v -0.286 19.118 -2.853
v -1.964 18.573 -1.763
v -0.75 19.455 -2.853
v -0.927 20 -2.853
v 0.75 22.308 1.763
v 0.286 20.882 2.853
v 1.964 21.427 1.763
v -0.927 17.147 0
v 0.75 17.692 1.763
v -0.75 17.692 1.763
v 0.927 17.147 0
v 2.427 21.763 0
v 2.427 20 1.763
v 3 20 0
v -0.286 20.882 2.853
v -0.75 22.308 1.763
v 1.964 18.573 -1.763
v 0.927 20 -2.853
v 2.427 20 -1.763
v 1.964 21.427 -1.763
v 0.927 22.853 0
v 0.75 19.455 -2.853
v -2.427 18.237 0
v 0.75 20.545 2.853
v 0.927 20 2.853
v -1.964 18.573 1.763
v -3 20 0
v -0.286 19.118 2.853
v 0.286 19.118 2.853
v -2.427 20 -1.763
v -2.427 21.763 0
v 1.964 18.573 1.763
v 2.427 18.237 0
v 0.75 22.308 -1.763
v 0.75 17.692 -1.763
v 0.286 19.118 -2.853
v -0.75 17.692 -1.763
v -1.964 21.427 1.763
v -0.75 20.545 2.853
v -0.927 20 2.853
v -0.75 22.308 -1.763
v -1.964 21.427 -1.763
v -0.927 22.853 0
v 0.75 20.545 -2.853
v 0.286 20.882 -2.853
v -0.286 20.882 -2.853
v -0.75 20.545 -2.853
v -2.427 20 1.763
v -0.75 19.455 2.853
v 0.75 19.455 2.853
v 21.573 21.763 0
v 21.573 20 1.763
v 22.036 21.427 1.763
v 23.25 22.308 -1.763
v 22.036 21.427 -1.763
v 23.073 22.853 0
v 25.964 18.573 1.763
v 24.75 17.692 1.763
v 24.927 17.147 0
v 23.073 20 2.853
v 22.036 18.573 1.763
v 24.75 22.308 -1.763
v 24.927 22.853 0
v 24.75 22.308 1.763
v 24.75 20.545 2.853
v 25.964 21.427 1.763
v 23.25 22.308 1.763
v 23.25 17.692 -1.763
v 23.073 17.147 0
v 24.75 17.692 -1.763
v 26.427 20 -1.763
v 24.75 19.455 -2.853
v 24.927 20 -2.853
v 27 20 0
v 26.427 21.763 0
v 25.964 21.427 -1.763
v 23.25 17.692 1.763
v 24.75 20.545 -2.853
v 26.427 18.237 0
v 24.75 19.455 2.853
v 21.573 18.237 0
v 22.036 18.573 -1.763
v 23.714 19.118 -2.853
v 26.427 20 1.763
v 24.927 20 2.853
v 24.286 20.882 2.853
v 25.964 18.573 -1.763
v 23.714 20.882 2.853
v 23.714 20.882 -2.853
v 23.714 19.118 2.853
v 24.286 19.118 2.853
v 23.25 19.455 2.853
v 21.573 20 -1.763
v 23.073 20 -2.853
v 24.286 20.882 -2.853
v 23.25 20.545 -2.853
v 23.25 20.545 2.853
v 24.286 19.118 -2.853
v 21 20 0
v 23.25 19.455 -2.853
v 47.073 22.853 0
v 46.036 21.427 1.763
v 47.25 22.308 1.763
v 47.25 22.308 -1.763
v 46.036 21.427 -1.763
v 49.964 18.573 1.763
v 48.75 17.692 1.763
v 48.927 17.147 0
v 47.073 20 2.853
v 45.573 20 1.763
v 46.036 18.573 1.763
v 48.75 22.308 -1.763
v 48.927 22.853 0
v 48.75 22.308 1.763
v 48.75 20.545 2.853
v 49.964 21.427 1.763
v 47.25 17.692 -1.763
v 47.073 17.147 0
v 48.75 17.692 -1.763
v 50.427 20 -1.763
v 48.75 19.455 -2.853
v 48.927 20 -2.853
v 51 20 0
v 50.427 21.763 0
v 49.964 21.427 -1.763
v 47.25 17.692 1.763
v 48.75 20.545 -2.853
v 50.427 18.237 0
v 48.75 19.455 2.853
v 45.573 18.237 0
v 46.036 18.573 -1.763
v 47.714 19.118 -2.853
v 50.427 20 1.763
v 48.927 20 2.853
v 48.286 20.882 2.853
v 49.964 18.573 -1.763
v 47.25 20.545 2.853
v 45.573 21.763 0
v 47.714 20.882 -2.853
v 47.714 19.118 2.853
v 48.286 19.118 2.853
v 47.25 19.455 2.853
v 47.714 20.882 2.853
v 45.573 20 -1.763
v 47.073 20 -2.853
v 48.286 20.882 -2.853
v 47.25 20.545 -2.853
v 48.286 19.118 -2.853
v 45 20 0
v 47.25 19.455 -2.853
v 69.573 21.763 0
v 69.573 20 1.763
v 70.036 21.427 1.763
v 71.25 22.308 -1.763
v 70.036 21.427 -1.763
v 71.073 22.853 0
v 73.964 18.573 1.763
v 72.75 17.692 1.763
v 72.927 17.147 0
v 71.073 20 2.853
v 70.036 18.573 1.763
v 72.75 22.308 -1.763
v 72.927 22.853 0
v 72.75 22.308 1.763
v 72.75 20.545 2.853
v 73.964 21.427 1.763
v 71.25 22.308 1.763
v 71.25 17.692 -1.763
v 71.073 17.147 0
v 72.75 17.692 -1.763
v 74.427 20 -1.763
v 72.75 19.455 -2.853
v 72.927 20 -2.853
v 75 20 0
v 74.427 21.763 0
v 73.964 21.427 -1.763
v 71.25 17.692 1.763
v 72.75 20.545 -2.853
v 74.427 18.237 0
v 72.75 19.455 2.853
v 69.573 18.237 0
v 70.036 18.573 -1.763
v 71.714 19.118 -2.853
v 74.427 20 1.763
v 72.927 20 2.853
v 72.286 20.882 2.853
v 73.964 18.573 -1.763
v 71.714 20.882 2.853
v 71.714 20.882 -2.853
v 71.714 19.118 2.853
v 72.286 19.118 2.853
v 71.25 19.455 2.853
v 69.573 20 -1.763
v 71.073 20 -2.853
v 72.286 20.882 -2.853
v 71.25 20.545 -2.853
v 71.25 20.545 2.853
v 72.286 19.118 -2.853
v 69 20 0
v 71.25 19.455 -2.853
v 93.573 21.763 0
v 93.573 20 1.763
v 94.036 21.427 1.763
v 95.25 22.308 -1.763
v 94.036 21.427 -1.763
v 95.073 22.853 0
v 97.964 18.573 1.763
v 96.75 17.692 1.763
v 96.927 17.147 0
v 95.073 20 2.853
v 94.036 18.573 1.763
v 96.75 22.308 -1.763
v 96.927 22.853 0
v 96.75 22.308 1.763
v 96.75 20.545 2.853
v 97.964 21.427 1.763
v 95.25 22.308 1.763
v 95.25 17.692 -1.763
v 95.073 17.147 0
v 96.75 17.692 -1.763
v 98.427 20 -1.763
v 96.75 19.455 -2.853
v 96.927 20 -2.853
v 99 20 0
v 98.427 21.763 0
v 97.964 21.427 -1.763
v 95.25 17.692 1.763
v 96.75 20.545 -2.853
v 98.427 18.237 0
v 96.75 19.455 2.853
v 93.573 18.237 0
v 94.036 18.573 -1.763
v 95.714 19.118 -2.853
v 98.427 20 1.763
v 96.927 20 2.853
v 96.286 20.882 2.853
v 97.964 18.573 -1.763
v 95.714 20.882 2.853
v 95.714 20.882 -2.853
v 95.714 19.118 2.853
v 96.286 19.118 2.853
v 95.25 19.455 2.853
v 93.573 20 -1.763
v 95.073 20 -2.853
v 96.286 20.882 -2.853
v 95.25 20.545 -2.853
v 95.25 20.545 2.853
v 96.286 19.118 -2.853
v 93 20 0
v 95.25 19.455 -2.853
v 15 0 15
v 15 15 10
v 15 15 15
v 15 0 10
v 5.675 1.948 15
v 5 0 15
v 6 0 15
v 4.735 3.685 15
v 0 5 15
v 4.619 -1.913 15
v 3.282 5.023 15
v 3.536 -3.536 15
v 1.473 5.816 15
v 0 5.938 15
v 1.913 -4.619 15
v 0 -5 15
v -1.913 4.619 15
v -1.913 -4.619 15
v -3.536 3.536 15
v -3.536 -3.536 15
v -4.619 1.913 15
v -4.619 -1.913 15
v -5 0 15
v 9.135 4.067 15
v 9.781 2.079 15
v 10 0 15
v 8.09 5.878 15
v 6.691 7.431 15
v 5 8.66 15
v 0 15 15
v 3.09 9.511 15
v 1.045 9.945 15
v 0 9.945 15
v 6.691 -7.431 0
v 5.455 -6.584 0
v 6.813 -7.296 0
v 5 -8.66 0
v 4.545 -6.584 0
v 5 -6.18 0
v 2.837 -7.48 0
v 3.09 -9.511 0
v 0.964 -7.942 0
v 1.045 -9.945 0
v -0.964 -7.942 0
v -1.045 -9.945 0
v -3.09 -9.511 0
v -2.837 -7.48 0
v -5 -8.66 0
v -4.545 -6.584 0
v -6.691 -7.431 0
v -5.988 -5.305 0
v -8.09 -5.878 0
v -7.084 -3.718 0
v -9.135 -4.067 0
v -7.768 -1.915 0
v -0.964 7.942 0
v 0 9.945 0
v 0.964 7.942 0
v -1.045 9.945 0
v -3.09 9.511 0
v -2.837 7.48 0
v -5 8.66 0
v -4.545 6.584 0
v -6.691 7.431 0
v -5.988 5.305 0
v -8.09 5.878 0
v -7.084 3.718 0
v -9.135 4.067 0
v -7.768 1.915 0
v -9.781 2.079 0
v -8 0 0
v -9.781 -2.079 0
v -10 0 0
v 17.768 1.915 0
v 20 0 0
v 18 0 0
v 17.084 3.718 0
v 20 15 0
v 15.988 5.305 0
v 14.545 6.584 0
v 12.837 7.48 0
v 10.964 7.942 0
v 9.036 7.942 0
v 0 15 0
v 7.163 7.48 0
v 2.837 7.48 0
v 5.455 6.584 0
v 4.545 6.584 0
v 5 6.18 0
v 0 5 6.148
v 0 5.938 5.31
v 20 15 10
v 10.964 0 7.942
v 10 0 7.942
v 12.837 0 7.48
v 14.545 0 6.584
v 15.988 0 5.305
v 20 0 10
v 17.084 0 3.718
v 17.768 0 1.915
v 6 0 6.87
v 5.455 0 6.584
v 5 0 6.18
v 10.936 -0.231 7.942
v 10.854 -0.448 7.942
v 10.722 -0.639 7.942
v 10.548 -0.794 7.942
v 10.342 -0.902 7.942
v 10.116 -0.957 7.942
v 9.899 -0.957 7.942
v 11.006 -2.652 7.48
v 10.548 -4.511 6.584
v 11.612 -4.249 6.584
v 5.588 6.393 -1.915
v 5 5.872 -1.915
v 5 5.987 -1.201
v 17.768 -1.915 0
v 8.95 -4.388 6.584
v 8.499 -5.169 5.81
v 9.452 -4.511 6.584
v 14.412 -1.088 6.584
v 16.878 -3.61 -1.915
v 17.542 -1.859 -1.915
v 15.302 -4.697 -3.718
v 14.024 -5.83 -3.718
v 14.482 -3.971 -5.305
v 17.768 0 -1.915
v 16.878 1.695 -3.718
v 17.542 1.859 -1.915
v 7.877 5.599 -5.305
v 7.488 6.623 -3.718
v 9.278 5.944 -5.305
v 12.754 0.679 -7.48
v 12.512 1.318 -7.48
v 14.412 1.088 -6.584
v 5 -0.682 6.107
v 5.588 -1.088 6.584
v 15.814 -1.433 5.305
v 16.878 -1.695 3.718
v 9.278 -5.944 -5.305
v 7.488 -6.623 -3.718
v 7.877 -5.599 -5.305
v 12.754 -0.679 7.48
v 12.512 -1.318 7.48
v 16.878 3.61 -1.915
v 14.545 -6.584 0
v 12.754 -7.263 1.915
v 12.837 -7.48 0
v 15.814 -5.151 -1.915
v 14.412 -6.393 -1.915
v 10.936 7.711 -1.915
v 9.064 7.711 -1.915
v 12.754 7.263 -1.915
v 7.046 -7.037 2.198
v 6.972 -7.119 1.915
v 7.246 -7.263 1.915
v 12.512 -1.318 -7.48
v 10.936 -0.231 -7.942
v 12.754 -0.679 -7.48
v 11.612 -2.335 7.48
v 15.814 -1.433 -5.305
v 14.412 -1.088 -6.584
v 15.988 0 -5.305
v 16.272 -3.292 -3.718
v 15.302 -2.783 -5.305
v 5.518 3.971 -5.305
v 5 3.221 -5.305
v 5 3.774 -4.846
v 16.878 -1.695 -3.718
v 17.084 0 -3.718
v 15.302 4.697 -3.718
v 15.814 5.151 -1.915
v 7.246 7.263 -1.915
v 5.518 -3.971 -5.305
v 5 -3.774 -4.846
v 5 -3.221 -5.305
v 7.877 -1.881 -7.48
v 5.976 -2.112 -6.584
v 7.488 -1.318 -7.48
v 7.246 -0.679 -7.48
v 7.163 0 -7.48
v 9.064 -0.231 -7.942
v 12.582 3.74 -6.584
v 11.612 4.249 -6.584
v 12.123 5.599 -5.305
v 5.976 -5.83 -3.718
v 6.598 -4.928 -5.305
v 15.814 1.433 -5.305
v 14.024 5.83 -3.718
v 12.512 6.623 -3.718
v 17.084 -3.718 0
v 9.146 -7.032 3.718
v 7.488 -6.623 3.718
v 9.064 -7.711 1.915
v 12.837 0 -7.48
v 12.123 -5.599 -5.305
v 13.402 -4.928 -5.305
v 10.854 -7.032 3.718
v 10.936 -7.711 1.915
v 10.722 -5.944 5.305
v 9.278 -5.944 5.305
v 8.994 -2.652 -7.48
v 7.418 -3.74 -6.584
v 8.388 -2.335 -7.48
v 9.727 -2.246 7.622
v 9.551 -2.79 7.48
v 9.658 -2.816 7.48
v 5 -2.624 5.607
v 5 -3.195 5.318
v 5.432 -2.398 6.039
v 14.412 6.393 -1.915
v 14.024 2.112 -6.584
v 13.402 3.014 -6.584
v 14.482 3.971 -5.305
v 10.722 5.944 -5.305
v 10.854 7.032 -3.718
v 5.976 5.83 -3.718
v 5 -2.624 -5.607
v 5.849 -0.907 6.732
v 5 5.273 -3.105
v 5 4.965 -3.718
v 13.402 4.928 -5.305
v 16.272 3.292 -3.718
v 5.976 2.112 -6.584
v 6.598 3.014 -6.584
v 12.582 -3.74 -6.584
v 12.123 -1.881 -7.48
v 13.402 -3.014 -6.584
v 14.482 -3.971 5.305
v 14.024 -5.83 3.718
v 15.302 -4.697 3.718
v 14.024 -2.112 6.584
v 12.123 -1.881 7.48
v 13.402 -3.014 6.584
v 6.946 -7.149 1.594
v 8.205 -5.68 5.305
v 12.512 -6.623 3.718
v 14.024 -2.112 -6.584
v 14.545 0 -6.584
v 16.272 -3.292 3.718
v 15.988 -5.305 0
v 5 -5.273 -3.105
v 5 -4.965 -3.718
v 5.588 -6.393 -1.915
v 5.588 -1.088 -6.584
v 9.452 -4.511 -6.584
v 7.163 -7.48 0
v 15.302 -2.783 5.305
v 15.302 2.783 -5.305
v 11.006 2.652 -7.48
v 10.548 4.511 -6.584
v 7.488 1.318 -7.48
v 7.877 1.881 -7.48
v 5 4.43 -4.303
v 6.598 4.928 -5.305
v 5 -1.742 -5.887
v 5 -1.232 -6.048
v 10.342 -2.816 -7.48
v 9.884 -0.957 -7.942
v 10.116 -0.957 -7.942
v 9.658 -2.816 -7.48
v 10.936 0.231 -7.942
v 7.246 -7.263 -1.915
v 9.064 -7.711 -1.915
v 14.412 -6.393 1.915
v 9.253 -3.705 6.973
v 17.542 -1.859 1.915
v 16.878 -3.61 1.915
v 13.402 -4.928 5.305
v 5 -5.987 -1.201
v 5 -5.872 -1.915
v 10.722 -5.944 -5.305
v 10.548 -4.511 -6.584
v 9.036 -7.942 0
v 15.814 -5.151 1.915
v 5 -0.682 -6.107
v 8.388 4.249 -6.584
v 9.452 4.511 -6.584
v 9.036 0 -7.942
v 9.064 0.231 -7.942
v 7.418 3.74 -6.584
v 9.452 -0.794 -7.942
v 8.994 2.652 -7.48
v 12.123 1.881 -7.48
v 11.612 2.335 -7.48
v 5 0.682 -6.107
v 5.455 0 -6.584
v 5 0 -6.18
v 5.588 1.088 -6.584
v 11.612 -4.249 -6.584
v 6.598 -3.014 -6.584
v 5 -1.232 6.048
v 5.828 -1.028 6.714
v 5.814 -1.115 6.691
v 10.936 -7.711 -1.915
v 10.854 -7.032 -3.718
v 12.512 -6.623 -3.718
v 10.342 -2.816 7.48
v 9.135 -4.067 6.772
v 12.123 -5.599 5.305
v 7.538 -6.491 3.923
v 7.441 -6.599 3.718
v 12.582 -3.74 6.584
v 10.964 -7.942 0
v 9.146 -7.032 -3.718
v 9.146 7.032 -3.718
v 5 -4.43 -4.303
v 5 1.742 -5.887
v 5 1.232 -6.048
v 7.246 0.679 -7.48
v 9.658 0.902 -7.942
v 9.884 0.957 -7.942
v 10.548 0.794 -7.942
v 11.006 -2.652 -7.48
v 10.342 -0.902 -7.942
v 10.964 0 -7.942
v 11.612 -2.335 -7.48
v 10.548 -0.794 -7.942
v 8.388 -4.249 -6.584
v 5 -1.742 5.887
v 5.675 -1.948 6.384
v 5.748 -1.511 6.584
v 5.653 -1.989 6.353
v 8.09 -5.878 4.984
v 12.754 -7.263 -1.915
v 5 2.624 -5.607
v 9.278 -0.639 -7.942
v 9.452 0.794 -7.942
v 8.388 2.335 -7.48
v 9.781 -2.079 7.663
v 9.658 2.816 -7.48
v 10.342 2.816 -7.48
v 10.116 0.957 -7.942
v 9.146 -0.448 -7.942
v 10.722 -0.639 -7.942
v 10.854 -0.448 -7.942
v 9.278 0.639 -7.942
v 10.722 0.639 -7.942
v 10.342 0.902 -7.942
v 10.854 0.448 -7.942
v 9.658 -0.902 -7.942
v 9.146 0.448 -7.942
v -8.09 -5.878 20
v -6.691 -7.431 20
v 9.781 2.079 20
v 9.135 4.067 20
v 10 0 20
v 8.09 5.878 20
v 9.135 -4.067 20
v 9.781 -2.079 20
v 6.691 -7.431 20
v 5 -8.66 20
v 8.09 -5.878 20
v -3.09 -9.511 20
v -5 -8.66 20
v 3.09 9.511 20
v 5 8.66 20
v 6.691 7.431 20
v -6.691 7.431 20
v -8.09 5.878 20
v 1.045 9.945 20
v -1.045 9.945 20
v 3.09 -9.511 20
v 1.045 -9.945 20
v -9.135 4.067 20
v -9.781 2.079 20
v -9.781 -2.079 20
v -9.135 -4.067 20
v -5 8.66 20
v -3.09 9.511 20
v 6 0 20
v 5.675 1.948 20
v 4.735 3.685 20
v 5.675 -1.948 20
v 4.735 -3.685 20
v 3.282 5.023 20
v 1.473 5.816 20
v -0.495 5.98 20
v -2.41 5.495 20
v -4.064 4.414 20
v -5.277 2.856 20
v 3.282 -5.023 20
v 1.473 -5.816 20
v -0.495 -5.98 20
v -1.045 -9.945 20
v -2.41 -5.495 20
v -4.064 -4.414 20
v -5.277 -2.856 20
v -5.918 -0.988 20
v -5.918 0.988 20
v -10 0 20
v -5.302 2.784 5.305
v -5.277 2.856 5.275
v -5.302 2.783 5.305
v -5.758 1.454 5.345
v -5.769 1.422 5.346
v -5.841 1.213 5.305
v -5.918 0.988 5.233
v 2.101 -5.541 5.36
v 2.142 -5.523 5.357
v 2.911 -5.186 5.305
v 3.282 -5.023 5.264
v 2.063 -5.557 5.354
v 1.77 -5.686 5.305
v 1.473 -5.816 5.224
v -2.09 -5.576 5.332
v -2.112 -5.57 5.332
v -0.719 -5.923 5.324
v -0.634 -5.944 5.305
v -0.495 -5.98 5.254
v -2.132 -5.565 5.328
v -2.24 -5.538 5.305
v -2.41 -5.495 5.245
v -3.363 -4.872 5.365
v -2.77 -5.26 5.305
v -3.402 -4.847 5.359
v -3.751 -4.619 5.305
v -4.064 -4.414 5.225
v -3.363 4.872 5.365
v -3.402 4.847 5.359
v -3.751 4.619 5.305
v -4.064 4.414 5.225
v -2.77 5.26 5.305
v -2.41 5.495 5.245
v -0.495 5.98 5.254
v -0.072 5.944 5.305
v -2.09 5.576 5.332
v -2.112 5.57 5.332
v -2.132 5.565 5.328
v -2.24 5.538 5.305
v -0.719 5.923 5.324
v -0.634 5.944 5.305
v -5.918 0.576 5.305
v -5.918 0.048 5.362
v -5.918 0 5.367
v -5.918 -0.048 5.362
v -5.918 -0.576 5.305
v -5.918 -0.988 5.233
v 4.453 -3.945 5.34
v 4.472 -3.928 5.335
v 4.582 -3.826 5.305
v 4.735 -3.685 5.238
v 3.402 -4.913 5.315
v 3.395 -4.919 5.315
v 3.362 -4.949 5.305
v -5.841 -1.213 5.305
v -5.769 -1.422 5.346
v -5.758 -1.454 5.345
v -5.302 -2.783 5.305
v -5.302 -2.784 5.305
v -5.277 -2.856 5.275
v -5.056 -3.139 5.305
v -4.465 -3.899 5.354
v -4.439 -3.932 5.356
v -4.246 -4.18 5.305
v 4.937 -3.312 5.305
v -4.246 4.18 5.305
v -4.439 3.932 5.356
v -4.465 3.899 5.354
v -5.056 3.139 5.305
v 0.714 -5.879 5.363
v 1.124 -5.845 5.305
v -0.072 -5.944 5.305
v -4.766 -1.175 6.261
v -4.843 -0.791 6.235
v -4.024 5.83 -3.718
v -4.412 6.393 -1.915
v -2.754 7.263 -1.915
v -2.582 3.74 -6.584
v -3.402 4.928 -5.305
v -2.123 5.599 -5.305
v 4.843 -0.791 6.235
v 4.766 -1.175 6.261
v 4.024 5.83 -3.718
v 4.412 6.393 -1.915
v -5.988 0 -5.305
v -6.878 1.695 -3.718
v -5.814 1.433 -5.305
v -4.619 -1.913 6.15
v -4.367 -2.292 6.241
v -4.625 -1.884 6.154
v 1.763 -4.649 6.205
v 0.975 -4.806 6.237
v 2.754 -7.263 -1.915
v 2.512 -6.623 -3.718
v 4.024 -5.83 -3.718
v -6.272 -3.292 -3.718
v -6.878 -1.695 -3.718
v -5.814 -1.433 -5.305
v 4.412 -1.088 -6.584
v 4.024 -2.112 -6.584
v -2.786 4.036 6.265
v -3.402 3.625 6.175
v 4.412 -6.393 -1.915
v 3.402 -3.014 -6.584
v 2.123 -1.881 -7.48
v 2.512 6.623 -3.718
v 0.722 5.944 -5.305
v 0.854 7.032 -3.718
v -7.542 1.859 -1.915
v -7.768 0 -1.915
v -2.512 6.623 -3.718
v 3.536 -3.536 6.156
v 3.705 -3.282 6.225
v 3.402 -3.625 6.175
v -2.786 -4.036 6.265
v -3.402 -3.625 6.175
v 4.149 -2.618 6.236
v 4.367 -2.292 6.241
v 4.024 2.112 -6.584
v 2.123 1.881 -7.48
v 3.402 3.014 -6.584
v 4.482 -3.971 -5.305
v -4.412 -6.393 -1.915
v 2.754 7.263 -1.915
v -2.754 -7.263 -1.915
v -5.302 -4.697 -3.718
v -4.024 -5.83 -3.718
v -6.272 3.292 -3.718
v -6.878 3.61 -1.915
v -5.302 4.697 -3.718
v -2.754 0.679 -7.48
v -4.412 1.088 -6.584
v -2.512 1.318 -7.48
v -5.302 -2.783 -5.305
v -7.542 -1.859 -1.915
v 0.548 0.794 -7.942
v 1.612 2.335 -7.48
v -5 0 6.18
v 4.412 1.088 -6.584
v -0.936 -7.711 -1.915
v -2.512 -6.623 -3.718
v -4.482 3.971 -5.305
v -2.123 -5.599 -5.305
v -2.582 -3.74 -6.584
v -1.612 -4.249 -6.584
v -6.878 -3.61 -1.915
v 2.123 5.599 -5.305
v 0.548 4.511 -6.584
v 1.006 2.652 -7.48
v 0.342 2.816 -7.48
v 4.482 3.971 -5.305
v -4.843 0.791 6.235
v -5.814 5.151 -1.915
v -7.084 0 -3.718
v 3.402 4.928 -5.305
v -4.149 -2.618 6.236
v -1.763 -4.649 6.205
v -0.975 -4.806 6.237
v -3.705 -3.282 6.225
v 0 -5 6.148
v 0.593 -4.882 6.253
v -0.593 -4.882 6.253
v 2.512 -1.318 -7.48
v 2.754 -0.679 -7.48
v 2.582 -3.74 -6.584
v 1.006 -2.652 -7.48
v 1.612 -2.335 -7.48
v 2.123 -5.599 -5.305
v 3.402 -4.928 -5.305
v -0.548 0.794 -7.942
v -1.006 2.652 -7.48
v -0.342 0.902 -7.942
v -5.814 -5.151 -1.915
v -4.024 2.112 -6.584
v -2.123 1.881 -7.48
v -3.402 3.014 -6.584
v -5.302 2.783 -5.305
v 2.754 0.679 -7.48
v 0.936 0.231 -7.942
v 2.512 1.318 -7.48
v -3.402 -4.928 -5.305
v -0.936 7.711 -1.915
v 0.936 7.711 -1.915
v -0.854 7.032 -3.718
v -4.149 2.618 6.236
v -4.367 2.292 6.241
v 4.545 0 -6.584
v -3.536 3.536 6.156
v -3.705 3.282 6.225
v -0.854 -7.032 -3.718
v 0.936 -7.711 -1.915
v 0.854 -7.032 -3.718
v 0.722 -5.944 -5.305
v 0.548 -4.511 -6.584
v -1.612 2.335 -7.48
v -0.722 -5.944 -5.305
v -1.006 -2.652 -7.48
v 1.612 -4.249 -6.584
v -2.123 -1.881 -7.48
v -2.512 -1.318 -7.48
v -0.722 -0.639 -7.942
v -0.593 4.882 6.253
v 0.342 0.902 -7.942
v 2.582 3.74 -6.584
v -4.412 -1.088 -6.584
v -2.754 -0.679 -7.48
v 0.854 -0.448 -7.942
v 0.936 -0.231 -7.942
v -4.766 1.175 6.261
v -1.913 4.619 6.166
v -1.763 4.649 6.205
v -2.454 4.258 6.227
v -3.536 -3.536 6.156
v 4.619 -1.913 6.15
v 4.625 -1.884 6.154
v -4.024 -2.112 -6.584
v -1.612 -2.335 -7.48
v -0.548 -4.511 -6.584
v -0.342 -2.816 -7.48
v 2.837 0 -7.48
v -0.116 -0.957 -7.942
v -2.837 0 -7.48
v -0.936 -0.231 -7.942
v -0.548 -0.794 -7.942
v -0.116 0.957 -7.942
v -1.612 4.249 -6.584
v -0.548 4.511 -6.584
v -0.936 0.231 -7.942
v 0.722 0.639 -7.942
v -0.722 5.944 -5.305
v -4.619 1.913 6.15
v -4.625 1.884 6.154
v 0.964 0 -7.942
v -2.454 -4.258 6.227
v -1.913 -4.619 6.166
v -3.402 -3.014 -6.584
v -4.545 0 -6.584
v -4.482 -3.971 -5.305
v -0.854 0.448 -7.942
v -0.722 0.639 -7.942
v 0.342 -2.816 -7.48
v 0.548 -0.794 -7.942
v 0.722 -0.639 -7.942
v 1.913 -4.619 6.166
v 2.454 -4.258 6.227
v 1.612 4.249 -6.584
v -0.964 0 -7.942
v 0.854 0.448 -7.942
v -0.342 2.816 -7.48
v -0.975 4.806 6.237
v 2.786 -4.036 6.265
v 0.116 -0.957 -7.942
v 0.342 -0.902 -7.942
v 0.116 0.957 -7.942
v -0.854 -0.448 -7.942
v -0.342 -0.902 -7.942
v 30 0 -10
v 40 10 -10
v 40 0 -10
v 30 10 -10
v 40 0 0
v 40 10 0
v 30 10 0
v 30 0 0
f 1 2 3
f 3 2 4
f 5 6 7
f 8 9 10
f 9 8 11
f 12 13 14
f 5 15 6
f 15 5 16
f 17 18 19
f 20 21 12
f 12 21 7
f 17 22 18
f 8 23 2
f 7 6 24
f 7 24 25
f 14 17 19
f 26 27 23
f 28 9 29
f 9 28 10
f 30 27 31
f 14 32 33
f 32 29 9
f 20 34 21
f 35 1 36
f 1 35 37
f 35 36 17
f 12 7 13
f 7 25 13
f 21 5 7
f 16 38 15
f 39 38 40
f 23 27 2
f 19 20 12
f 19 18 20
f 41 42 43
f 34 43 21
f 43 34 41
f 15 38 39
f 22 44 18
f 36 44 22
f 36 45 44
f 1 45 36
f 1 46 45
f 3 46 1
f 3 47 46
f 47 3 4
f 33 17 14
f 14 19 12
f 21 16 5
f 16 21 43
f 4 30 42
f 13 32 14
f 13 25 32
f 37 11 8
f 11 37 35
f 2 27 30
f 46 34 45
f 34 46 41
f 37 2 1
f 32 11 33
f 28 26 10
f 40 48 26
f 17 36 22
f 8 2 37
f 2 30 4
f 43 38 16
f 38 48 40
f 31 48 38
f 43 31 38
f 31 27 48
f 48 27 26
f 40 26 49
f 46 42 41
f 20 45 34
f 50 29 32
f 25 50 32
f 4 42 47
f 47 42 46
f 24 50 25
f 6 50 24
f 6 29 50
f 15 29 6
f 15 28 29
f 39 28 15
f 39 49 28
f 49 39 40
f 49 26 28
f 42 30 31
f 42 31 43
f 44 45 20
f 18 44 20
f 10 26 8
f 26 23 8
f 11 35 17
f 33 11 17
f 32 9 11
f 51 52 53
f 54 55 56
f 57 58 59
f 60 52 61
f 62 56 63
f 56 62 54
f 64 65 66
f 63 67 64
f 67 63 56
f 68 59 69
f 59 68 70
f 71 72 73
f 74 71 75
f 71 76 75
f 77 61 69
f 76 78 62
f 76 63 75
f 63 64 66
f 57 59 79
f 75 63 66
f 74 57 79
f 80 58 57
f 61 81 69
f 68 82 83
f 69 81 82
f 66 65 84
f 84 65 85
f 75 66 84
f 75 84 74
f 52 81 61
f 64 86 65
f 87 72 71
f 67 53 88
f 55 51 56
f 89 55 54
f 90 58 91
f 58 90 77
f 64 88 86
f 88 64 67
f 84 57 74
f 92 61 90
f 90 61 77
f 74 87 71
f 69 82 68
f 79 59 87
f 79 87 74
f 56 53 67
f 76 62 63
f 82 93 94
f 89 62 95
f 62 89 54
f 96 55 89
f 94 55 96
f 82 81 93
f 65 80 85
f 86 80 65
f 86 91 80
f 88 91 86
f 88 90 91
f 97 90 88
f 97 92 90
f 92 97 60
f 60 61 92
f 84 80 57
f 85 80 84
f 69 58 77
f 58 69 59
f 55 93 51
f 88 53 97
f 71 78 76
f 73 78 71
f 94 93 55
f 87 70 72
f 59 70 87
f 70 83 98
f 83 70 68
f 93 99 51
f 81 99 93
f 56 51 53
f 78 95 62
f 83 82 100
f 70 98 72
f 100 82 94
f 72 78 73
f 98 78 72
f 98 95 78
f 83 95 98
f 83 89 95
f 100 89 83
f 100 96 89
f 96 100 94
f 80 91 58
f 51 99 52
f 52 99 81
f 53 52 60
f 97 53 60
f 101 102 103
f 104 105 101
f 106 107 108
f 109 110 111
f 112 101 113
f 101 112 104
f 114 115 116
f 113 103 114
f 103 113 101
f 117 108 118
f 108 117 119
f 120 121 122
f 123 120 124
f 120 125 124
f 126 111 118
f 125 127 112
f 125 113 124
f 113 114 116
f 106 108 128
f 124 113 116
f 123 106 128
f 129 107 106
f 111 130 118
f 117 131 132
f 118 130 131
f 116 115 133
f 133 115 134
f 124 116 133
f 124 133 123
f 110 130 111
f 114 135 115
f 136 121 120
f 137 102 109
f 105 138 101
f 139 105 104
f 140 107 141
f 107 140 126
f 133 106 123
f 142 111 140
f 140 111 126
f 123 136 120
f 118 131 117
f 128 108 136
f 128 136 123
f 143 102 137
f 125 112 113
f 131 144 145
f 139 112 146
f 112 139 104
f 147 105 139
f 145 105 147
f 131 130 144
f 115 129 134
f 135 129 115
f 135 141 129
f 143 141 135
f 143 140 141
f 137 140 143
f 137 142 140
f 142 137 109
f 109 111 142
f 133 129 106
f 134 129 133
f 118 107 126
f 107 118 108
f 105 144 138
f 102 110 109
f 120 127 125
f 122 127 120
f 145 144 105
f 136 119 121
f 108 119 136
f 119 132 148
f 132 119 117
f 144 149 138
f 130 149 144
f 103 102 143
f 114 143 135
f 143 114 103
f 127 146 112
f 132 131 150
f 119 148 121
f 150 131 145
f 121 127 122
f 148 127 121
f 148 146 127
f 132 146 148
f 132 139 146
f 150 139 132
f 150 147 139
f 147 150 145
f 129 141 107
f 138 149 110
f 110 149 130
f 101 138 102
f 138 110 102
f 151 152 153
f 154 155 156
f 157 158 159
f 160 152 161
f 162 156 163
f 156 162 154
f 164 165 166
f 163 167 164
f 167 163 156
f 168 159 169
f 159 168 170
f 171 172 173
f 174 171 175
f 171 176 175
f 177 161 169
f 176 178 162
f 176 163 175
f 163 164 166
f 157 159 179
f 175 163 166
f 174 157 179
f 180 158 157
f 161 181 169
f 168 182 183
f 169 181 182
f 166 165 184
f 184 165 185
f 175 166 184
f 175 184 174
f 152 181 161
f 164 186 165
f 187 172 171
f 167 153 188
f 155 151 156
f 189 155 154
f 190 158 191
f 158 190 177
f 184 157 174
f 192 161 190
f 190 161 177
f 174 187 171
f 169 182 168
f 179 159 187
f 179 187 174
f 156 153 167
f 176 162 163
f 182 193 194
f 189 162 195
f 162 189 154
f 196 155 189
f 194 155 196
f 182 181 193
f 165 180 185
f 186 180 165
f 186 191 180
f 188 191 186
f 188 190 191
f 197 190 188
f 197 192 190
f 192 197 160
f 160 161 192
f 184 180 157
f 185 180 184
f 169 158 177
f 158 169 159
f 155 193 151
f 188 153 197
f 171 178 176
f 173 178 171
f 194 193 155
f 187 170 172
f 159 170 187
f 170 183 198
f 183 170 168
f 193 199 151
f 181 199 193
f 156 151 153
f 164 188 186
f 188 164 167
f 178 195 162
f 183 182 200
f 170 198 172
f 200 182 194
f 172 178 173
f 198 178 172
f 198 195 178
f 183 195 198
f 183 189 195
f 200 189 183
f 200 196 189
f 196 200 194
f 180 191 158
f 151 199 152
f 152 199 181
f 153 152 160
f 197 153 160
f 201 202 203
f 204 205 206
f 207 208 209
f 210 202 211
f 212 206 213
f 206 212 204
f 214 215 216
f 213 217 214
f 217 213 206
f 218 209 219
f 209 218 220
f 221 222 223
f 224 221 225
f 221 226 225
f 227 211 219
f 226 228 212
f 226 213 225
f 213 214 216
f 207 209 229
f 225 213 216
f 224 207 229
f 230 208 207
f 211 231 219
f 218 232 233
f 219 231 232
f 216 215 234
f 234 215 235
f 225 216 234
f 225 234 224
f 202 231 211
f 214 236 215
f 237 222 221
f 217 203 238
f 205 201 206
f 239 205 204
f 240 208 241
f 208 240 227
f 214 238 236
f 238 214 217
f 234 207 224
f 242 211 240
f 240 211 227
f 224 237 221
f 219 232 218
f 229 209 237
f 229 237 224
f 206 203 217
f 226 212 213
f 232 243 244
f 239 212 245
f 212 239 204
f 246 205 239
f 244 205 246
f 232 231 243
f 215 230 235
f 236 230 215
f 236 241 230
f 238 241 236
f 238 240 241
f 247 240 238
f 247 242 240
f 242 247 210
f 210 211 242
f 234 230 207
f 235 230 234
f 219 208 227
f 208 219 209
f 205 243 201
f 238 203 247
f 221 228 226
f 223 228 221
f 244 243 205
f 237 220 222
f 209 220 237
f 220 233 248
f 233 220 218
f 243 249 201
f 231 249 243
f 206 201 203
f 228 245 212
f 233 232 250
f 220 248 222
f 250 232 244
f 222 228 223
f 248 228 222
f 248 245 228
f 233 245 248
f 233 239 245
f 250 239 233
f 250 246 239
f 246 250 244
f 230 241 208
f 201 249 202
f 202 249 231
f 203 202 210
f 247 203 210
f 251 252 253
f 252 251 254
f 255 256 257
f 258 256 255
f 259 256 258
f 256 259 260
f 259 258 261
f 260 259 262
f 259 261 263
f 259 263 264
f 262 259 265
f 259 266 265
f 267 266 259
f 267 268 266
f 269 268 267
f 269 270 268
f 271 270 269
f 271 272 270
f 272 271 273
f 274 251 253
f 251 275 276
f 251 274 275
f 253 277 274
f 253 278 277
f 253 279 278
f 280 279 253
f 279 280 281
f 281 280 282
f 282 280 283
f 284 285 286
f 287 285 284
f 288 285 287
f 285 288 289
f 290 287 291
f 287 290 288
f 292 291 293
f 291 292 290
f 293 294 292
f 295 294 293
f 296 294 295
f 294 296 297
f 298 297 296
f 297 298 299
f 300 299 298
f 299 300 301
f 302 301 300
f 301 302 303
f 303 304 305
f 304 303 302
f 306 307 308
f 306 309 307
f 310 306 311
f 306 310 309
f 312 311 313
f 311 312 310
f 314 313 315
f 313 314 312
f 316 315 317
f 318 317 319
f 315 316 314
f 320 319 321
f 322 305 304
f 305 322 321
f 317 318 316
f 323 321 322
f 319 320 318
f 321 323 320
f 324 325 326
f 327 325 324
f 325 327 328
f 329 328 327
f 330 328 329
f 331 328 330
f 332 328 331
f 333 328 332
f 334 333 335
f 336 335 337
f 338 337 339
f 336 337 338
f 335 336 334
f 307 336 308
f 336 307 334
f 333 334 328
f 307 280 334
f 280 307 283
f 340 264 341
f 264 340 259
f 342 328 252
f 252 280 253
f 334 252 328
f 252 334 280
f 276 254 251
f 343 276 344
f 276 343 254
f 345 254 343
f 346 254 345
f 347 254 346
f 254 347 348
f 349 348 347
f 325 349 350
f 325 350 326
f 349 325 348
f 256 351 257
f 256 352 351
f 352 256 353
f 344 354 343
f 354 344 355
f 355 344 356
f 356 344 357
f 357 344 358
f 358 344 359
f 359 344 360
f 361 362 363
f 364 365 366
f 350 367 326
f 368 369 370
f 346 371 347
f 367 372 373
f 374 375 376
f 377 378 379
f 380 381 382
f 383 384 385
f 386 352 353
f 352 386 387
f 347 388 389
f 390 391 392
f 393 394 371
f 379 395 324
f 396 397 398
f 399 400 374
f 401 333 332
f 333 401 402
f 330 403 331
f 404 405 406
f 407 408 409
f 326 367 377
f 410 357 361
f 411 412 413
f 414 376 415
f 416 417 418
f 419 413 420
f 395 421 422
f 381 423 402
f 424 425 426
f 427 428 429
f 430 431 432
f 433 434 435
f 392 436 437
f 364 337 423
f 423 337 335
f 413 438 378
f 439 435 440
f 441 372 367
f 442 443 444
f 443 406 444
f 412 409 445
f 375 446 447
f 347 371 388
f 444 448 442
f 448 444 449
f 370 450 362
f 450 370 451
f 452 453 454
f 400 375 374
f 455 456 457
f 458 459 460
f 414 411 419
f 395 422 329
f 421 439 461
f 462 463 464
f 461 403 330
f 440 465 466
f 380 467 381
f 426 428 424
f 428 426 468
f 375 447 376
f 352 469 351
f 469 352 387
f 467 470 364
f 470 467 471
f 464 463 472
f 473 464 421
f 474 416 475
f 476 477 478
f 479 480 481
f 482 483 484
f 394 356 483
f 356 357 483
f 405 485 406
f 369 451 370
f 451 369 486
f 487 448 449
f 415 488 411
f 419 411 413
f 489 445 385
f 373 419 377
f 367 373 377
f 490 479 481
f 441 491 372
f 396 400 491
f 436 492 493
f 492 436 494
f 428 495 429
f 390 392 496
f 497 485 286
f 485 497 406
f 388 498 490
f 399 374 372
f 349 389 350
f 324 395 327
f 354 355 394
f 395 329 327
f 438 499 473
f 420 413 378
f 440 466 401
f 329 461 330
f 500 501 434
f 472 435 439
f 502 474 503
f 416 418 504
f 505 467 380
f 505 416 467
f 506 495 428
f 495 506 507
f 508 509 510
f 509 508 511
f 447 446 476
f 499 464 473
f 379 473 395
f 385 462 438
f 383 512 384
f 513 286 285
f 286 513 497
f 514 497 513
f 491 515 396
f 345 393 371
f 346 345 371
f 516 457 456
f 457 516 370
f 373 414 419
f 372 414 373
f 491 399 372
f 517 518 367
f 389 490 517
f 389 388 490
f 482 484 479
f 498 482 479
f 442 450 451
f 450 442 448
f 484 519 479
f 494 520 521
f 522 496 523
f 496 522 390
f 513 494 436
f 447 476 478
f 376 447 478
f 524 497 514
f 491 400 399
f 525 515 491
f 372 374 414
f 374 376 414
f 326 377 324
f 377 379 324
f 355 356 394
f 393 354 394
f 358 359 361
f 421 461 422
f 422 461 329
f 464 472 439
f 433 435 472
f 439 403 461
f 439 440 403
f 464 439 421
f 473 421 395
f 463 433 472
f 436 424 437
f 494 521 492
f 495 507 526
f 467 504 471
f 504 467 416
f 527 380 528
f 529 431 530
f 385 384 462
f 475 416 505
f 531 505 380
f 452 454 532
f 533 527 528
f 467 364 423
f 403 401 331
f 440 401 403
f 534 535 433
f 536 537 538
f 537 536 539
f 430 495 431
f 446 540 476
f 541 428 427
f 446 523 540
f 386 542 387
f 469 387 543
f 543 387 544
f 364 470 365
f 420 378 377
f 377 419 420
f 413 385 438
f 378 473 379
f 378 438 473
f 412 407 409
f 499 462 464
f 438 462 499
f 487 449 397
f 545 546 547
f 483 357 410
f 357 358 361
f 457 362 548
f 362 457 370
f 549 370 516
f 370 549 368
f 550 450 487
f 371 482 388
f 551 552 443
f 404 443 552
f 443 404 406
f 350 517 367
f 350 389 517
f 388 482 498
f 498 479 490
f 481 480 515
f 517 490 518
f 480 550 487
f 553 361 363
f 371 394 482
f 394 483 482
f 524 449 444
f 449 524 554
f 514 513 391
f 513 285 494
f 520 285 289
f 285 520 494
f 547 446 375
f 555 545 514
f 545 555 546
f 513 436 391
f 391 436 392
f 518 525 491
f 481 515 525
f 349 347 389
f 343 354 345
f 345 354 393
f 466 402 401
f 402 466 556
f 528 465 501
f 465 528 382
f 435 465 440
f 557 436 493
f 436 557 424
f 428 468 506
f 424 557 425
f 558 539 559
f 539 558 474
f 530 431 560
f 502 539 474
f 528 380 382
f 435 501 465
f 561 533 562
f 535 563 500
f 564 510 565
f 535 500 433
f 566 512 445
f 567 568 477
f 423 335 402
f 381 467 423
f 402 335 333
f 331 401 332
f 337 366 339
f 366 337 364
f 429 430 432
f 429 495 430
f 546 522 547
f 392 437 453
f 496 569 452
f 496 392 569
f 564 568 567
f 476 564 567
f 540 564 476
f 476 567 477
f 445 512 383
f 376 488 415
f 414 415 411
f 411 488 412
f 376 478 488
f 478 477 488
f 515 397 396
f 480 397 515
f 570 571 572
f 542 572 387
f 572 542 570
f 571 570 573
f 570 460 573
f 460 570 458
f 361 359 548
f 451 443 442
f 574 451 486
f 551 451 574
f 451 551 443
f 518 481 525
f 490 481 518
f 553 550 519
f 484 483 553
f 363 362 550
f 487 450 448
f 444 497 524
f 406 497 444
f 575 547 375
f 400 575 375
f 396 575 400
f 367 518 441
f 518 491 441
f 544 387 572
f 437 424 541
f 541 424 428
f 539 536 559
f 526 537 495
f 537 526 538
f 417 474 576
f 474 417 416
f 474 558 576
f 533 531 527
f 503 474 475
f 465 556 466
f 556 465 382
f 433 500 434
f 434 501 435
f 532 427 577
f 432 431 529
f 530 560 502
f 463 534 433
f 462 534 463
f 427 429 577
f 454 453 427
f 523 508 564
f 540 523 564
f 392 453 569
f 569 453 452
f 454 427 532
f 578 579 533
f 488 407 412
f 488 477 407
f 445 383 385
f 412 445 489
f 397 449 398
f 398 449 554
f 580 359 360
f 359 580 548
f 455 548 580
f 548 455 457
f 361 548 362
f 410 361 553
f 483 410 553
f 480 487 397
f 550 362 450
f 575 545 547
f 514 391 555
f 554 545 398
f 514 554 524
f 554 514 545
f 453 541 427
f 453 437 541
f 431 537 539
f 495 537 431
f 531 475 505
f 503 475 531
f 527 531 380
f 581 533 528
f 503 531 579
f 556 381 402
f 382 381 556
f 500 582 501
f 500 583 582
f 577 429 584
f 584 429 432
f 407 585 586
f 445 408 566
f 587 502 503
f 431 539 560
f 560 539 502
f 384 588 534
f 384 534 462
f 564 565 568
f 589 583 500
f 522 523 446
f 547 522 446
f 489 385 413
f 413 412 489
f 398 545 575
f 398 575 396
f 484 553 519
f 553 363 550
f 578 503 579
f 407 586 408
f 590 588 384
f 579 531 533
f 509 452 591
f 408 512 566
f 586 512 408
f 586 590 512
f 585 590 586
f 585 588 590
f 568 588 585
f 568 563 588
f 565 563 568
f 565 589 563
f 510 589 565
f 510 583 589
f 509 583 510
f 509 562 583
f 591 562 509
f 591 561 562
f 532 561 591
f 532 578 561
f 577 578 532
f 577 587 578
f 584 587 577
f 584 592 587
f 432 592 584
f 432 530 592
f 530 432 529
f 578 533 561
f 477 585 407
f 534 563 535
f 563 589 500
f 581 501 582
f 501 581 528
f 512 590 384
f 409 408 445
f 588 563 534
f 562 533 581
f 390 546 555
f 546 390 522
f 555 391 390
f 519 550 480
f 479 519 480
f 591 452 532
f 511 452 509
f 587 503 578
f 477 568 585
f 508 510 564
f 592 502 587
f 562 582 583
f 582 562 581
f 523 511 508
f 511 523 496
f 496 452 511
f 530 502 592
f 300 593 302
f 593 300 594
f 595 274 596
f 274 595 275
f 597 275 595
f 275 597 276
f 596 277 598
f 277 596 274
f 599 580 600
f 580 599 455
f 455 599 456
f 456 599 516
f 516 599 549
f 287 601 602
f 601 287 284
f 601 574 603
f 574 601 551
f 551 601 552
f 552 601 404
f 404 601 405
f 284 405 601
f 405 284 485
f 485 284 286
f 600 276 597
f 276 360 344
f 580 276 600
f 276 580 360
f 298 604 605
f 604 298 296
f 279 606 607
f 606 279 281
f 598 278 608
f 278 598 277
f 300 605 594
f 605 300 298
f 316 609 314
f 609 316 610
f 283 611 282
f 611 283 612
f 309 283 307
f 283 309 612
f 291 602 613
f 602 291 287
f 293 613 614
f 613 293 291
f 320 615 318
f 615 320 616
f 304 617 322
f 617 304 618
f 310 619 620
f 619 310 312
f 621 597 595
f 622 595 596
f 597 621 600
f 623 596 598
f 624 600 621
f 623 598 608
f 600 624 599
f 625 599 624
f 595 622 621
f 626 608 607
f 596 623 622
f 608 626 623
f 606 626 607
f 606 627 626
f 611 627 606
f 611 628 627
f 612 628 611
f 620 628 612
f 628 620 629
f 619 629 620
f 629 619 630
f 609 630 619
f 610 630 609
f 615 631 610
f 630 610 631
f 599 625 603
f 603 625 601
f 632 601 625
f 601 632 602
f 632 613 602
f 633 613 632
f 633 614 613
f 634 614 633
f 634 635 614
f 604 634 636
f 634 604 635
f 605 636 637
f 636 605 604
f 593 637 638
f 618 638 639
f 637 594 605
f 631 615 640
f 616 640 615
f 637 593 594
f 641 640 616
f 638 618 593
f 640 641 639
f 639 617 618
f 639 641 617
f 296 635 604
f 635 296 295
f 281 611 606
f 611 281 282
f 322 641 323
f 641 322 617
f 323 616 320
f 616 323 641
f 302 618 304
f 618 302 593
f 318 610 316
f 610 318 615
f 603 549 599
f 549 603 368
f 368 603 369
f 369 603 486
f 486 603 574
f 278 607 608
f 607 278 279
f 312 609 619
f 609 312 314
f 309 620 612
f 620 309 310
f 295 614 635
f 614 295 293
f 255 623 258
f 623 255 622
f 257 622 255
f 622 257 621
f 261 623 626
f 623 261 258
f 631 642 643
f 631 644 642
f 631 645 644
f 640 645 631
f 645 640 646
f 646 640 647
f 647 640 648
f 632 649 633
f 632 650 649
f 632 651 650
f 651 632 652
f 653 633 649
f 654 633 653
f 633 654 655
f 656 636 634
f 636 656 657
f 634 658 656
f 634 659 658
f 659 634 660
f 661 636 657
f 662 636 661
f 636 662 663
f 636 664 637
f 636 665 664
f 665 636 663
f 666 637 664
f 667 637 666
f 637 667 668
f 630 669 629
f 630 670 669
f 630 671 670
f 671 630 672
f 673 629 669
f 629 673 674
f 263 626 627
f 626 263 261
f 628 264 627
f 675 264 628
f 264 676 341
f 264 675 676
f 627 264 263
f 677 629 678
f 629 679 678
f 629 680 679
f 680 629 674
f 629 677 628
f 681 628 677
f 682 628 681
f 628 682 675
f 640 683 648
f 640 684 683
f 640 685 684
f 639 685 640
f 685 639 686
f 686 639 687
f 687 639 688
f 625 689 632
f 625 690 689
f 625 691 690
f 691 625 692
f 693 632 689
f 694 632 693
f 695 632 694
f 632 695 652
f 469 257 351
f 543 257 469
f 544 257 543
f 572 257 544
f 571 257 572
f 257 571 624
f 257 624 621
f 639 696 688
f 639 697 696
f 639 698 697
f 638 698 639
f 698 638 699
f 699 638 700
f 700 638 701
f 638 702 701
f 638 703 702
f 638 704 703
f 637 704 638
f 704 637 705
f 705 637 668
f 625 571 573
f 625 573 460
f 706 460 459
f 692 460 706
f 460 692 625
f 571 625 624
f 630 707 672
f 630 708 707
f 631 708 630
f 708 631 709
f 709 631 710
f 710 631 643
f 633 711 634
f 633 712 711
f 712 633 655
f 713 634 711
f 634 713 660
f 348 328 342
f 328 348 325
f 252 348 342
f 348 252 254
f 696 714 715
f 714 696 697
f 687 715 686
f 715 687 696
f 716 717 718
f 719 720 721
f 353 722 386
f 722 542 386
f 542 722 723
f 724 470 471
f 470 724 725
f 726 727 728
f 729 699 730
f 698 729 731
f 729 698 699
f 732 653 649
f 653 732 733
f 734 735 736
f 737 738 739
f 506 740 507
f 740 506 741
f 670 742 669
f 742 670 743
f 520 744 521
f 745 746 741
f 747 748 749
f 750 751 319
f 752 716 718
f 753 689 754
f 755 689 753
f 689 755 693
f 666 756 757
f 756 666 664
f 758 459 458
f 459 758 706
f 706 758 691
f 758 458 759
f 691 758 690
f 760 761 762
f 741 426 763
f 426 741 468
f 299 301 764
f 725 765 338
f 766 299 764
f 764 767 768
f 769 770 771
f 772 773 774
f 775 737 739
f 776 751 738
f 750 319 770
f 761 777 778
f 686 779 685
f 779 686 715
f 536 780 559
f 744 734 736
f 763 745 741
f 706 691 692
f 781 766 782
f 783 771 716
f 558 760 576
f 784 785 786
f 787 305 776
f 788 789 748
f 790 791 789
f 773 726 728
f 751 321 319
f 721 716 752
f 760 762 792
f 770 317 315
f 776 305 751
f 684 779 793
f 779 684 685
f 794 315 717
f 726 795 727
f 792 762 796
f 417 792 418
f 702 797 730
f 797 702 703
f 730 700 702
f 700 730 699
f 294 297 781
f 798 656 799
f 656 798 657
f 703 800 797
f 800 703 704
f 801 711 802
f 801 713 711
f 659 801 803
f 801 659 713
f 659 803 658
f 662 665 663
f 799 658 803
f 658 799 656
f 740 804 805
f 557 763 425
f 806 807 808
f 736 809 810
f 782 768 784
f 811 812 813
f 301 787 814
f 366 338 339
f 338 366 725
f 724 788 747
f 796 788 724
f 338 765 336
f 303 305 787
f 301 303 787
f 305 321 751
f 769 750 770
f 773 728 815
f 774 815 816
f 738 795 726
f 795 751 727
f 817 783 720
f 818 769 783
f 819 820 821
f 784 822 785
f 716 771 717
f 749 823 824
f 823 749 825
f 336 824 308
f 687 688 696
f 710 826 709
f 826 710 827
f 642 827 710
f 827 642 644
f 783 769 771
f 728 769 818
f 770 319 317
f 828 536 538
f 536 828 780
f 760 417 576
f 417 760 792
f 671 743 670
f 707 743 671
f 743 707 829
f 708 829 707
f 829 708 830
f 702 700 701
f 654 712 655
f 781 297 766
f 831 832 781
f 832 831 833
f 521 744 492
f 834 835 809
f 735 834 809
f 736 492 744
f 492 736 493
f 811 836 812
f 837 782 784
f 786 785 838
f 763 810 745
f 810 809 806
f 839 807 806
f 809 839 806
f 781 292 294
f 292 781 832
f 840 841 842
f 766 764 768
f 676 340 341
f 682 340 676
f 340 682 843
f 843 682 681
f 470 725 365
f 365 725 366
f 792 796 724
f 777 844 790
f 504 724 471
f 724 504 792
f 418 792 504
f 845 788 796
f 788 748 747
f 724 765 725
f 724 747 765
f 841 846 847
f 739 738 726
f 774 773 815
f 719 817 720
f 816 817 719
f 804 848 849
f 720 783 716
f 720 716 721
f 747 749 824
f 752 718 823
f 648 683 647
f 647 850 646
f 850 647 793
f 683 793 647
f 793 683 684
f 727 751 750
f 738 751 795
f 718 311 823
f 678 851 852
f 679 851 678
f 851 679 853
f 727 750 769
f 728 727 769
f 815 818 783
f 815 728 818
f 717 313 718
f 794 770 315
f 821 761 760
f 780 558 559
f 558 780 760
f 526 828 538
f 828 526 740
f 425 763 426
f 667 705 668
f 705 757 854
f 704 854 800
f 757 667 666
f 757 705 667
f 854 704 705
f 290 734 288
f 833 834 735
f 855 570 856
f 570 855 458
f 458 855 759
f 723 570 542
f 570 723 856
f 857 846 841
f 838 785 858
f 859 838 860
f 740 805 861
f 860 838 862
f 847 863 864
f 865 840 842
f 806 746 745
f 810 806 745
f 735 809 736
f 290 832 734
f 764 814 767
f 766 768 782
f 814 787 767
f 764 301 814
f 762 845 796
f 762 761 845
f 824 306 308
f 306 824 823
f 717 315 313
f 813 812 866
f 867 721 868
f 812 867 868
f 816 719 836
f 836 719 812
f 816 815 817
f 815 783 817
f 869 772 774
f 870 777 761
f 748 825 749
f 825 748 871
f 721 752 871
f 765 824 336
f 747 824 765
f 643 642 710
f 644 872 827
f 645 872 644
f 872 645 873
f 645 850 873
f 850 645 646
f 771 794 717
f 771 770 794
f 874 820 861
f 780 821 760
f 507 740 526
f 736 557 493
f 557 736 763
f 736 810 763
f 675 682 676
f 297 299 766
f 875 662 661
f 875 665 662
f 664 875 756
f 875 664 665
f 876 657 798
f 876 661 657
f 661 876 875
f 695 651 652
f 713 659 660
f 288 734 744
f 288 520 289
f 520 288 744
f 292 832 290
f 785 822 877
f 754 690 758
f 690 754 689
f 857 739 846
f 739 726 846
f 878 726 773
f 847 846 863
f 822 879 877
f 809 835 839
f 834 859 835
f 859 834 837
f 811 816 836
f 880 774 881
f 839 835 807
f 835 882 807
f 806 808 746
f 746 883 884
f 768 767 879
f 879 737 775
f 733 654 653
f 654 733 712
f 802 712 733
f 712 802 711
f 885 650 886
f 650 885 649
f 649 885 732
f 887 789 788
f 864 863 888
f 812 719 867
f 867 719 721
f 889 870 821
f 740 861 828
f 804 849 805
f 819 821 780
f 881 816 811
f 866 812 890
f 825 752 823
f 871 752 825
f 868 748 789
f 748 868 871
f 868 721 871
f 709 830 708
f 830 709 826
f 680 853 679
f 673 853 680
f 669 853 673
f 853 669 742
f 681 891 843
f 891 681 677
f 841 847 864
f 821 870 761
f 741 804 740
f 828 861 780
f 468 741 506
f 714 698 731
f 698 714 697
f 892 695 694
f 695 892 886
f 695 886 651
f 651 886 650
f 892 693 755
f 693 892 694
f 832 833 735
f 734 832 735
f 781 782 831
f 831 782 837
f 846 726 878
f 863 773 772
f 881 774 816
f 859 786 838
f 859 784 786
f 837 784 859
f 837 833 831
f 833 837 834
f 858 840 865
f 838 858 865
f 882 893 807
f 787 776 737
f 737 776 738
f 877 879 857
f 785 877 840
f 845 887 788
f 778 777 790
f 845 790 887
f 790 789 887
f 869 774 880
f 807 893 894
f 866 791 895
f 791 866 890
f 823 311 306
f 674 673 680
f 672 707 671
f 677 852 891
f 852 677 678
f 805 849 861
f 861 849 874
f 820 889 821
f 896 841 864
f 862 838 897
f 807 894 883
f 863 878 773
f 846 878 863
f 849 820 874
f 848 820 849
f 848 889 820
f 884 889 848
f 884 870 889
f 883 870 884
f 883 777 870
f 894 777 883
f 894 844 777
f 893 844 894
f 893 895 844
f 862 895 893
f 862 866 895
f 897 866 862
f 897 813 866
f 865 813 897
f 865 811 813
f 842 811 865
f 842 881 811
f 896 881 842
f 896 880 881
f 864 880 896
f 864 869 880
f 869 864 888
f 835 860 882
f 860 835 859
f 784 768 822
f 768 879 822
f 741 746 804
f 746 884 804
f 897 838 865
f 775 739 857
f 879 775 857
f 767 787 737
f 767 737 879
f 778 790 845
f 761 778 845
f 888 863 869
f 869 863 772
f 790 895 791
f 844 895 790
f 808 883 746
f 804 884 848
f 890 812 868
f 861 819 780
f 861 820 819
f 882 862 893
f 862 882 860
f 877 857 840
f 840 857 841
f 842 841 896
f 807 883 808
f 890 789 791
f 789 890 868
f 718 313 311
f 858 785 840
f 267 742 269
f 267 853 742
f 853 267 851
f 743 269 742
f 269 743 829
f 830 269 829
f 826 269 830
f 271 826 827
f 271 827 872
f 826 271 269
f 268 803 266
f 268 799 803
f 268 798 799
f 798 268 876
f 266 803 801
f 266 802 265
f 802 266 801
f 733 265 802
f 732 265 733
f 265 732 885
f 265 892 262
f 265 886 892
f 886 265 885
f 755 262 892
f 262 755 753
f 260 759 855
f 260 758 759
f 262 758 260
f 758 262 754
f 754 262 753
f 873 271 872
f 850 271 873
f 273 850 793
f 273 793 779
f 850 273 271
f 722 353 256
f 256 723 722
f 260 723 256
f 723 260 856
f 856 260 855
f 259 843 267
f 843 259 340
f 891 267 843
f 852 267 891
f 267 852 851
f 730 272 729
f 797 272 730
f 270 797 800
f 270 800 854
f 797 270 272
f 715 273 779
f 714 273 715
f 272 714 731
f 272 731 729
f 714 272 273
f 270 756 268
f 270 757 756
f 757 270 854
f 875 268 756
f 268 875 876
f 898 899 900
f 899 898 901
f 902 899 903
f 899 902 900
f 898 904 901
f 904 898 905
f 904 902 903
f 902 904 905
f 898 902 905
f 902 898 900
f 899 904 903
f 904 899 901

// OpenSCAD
// Test OpenSCAD syntax highlighting features

// Variables
width = 20;
height = 15;
radius = 8;

// Built-in modules
cube([width, height, 10]);
sphere(r = radius);
cylinder(h = height, r = 5);

// Transformations
translate([30, 0, 0])
rotate([0, 90, 0])
  cube(10);

// Control structures
for (i = [0:2:8]) {
  translate([i * 12, 20, 0])
    sphere(3);
}

// Conditional
if (width > 15) {
  echo("Width is greater than 15");
}

// Custom module
module my_part(size = 10) {
  difference() {
    cube(size, center = true);
    cylinder(h = size + 2, r = size/4, center = true);
  }
}

// Boolean operations
union() {
  cube(15);
  translate([10, 0, 0])
    sphere(8);
}

difference() {
  cylinder(h = 20, r = 10);
  translate([0, 0, -1])
    cylinder(h = 22, r = 6);
}

// Special variables and functions
echo("Preview time: ", $t);
echo("Fragment count: ", $fn);
